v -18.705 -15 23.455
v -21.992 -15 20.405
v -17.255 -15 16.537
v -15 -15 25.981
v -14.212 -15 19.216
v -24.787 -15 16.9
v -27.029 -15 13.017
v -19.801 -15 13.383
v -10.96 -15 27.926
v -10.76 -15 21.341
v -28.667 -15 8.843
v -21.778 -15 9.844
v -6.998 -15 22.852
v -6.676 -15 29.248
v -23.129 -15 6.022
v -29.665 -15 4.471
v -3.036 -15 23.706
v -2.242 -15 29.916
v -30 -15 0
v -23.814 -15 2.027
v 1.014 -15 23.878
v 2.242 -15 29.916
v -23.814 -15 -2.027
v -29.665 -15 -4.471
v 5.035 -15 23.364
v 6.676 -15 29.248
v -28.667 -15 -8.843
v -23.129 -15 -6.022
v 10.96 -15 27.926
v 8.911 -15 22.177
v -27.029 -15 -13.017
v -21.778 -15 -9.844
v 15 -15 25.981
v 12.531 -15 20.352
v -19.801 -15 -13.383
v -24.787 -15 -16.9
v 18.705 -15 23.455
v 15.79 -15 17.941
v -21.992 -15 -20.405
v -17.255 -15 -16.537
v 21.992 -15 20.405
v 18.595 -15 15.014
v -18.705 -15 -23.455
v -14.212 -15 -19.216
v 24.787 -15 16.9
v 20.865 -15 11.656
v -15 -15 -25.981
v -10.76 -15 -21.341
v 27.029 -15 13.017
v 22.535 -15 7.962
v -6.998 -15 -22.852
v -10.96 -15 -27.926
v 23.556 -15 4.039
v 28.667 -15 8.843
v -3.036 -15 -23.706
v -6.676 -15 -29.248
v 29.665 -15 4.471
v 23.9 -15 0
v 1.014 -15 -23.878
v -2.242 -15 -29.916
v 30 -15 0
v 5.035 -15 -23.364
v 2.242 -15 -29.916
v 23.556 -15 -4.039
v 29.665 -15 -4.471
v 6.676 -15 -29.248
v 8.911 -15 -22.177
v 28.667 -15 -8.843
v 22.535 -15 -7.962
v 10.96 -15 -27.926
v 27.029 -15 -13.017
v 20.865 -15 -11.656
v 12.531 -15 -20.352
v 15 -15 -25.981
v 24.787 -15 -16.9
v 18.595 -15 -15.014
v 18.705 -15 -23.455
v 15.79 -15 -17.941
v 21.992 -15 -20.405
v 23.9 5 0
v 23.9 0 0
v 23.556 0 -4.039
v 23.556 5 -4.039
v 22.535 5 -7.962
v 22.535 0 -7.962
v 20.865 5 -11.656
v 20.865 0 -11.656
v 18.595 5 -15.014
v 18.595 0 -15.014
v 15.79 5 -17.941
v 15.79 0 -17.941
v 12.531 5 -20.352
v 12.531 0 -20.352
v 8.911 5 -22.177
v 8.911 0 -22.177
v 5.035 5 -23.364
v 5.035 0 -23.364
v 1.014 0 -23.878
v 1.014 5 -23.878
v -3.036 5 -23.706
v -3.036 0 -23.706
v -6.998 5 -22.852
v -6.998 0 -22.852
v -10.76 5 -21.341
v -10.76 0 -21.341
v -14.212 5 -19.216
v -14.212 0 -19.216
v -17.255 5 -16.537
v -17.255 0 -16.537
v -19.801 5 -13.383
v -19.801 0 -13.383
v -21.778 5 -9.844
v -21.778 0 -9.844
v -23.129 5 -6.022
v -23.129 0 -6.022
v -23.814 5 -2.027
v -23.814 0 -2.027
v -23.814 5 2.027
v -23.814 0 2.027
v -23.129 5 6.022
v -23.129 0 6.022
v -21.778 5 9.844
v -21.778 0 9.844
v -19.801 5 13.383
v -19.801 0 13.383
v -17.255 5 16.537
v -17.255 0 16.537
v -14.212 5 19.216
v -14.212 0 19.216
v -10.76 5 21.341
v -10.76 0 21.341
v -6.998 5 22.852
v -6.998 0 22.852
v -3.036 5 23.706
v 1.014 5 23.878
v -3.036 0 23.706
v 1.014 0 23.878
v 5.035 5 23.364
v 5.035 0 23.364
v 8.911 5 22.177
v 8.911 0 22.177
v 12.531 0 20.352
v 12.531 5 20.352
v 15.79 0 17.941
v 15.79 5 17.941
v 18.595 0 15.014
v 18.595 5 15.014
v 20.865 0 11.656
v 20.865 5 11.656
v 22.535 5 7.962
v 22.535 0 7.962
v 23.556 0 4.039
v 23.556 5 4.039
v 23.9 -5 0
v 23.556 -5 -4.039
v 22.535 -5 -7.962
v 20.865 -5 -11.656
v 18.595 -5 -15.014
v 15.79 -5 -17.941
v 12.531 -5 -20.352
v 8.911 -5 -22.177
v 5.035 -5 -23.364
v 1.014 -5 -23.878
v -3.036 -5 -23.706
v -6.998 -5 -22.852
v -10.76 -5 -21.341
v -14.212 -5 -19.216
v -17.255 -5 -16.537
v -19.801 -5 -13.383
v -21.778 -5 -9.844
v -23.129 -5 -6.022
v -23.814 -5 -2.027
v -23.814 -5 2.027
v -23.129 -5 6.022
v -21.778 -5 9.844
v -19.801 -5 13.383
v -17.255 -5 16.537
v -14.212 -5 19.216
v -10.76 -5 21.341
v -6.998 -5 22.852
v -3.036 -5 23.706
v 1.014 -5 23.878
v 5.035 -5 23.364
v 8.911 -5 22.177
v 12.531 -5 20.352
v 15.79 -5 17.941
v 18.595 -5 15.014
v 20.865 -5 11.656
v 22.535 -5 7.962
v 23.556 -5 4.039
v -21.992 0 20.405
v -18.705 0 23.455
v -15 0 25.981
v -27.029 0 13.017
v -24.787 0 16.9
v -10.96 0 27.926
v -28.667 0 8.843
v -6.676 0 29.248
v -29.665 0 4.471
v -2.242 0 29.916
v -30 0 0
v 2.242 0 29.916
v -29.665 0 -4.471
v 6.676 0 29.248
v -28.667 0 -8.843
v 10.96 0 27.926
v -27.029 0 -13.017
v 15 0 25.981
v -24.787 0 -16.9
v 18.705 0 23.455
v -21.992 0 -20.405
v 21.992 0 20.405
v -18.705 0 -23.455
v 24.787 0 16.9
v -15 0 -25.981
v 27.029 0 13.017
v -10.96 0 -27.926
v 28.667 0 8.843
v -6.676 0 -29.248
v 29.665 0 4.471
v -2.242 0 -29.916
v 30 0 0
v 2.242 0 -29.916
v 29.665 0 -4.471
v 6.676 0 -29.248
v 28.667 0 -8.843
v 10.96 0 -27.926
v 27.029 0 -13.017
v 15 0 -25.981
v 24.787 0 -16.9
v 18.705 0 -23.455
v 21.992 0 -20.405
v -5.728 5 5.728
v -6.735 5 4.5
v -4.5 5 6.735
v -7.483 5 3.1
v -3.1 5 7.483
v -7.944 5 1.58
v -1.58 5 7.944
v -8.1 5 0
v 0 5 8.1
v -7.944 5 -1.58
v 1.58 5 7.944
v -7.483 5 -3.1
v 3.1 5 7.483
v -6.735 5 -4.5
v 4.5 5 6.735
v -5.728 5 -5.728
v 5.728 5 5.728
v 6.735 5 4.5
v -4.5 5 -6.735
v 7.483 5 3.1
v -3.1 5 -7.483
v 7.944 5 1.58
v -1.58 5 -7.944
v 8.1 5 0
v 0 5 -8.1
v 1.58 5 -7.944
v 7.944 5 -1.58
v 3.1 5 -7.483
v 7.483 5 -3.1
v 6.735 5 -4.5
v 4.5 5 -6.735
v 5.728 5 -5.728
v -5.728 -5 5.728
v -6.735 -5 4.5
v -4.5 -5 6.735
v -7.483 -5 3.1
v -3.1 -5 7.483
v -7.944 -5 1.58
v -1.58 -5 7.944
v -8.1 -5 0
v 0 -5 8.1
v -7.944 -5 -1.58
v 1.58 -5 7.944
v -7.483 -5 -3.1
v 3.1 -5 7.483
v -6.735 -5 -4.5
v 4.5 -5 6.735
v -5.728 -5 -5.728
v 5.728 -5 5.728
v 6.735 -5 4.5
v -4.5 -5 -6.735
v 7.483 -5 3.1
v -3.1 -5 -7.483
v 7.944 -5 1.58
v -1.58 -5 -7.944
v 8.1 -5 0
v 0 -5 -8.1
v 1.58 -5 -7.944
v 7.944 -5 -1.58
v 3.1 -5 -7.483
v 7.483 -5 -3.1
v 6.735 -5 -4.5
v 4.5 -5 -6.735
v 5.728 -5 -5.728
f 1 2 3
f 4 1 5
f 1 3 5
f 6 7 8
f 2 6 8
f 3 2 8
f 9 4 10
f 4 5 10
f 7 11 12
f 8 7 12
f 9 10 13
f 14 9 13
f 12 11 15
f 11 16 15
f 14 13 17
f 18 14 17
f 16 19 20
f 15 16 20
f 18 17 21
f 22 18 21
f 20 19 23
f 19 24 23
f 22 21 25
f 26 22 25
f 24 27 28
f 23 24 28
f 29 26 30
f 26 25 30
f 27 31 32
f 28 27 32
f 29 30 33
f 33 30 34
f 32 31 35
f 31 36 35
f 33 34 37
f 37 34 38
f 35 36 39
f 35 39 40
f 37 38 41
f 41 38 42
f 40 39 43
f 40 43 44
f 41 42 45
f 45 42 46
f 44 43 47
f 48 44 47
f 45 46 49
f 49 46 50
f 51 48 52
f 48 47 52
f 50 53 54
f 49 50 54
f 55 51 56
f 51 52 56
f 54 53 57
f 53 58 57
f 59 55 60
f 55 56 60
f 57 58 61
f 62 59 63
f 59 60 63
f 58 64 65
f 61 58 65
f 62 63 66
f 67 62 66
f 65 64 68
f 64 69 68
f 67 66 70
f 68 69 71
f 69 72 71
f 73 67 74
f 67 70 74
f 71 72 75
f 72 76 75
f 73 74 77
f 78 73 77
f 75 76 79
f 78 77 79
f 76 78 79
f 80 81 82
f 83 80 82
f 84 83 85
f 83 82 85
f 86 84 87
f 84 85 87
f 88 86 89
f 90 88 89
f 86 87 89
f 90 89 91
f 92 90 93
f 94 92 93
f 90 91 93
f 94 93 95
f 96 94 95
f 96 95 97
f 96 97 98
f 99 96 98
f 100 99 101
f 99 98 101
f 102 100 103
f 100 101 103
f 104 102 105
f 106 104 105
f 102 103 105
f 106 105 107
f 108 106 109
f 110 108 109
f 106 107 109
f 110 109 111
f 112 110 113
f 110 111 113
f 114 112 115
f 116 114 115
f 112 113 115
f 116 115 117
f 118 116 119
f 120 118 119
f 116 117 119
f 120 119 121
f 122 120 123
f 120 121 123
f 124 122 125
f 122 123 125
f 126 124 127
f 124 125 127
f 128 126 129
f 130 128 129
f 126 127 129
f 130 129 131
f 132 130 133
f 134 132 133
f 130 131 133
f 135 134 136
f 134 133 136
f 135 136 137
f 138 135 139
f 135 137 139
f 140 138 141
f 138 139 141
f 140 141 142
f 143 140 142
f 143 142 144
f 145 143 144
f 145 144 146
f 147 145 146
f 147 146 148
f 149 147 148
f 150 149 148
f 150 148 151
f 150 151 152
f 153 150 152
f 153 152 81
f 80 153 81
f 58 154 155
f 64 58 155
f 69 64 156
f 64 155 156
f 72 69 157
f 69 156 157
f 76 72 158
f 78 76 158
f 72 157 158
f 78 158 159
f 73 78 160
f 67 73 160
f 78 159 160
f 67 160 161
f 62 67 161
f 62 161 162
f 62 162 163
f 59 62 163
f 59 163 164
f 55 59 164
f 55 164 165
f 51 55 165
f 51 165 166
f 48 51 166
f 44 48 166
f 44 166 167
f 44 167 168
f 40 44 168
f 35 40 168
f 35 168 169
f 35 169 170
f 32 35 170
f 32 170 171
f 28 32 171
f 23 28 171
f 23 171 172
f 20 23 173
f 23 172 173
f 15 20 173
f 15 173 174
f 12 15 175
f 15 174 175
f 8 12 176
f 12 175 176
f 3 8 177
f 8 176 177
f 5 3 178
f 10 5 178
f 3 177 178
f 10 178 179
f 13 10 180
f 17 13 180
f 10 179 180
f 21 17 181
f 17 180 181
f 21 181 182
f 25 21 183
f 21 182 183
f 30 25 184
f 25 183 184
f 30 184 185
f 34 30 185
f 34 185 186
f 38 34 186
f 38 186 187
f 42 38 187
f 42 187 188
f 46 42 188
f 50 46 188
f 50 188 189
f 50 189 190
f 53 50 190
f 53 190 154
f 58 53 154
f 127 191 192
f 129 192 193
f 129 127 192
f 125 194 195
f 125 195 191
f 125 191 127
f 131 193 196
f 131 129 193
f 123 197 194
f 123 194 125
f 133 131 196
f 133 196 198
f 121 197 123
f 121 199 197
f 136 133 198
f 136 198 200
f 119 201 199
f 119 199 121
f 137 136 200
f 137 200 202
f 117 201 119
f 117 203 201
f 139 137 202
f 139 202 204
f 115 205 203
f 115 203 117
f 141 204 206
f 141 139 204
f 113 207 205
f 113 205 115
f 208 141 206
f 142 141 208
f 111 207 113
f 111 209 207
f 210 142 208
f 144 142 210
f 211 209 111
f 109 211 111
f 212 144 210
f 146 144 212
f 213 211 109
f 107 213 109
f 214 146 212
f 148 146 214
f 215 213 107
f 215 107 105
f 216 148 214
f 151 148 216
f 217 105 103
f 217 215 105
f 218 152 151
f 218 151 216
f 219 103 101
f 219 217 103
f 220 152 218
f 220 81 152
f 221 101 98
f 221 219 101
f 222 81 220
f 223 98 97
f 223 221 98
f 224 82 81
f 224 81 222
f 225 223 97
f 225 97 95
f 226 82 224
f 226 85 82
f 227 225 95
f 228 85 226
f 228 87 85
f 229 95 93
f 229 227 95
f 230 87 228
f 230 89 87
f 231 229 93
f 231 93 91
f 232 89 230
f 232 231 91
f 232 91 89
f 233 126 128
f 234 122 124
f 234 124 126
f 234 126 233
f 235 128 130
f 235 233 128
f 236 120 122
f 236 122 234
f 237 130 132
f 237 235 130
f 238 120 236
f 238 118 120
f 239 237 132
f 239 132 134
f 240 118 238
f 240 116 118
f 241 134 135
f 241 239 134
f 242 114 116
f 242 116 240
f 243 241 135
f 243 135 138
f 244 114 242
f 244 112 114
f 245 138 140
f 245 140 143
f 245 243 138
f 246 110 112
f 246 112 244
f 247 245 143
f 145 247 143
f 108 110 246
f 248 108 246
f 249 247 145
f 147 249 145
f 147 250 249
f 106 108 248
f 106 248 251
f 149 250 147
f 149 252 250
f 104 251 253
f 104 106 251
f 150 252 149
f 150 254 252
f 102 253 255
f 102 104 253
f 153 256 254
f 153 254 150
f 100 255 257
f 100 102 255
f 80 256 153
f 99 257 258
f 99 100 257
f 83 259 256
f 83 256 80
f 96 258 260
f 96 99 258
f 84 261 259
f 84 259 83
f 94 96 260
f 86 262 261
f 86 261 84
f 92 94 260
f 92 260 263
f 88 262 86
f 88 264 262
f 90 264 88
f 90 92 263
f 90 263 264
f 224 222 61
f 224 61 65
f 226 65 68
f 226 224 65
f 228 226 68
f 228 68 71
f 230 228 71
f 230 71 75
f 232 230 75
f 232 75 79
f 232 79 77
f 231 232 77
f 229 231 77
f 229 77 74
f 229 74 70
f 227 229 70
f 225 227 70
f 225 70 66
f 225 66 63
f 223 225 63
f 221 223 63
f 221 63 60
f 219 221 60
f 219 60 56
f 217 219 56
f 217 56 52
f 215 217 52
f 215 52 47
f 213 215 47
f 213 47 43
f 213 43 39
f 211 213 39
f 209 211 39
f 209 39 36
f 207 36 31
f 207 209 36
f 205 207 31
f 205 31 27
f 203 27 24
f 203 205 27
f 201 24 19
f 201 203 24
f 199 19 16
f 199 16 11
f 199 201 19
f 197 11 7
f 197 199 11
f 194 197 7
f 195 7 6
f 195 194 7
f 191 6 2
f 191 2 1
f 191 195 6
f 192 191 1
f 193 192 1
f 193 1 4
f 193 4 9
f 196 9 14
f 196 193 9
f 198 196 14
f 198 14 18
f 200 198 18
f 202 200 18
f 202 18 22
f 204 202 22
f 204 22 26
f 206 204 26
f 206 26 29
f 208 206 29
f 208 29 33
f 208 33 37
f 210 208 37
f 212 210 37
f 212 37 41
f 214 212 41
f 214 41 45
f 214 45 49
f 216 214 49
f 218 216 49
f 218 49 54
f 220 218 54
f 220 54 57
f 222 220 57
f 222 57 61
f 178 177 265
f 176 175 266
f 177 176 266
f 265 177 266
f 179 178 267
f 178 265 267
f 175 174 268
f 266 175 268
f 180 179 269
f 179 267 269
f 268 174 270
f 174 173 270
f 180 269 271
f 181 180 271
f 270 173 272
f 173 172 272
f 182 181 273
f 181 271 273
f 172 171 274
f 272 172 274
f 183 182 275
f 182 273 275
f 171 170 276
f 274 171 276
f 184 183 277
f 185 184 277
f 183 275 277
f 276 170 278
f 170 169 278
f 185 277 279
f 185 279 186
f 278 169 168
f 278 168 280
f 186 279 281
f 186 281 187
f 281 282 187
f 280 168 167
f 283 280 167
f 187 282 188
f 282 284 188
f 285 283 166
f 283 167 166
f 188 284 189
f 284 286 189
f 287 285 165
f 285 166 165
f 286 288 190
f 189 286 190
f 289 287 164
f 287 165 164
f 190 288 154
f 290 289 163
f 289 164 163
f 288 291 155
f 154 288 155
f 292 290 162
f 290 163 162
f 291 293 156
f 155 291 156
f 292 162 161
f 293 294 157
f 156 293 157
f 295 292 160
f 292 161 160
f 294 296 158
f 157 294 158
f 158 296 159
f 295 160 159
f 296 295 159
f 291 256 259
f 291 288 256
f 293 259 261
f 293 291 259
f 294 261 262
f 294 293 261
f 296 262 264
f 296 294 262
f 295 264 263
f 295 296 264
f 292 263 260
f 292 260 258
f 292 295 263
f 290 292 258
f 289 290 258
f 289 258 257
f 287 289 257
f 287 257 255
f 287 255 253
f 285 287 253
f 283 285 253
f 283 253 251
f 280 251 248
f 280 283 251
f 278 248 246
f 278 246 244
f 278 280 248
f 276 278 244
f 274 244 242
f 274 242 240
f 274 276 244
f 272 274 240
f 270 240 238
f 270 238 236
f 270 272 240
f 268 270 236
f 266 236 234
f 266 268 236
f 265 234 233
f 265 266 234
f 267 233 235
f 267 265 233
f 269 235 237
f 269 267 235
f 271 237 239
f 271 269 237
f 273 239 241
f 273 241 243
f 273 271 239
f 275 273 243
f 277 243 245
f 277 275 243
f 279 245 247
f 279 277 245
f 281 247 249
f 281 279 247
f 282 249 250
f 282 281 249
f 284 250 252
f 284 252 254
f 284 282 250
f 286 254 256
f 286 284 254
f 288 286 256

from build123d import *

# Parameters (mm, degrees)
CROQUIS1_R              = 23.9
CROQUIS1_R_2            = 8.1
SALIENTE_EXTRUIR1_DEPTH = 5
SALIENTE_EXTRUIR2_START = -5
CROQUIS1_3_R            = 30
CROQUIS1_3_R_2          = 8.1
SALIENTE_EXTRUIR2_DEPTH = 5
SALIENTE_EXTRUIR3_START = -15
CROQUIS1_4_R            = 30
CROQUIS1_4_R_2          = 23.9
SALIENTE_EXTRUIR3_DEPTH = 15


with BuildPart() as part:
    # Croquis1 → Saliente-Extruir1 (new body)
    with BuildSketch(Plane(origin=(0, 0, 0), x_dir=(1, 0, 0), z_dir=(0, 1, 0))):
        Circle(CROQUIS1_R)
        Circle(CROQUIS1_R_2, mode=Mode.SUBTRACT)
    extrude(amount=SALIENTE_EXTRUIR1_DEPTH)

    # Croquis1<3> → Saliente-Extruir2 (add)
    with BuildSketch(Plane(origin=(0, 0, 0), x_dir=(1, 0, 0), z_dir=(0, 1, 0)).offset(SALIENTE_EXTRUIR2_START)):
        Circle(CROQUIS1_3_R)
        Circle(CROQUIS1_3_R_2, mode=Mode.SUBTRACT)
    extrude(amount=SALIENTE_EXTRUIR2_DEPTH)

    # Croquis1<4> → Saliente-Extruir3 (add)
    with BuildSketch(Plane(origin=(0, 0, 0), x_dir=(1, 0, 0), z_dir=(0, 1, 0)).offset(SALIENTE_EXTRUIR3_START)):
        Circle(CROQUIS1_4_R)
        Circle(CROQUIS1_4_R_2, mode=Mode.SUBTRACT)
    extrude(amount=SALIENTE_EXTRUIR3_DEPTH)


solid = part.part
